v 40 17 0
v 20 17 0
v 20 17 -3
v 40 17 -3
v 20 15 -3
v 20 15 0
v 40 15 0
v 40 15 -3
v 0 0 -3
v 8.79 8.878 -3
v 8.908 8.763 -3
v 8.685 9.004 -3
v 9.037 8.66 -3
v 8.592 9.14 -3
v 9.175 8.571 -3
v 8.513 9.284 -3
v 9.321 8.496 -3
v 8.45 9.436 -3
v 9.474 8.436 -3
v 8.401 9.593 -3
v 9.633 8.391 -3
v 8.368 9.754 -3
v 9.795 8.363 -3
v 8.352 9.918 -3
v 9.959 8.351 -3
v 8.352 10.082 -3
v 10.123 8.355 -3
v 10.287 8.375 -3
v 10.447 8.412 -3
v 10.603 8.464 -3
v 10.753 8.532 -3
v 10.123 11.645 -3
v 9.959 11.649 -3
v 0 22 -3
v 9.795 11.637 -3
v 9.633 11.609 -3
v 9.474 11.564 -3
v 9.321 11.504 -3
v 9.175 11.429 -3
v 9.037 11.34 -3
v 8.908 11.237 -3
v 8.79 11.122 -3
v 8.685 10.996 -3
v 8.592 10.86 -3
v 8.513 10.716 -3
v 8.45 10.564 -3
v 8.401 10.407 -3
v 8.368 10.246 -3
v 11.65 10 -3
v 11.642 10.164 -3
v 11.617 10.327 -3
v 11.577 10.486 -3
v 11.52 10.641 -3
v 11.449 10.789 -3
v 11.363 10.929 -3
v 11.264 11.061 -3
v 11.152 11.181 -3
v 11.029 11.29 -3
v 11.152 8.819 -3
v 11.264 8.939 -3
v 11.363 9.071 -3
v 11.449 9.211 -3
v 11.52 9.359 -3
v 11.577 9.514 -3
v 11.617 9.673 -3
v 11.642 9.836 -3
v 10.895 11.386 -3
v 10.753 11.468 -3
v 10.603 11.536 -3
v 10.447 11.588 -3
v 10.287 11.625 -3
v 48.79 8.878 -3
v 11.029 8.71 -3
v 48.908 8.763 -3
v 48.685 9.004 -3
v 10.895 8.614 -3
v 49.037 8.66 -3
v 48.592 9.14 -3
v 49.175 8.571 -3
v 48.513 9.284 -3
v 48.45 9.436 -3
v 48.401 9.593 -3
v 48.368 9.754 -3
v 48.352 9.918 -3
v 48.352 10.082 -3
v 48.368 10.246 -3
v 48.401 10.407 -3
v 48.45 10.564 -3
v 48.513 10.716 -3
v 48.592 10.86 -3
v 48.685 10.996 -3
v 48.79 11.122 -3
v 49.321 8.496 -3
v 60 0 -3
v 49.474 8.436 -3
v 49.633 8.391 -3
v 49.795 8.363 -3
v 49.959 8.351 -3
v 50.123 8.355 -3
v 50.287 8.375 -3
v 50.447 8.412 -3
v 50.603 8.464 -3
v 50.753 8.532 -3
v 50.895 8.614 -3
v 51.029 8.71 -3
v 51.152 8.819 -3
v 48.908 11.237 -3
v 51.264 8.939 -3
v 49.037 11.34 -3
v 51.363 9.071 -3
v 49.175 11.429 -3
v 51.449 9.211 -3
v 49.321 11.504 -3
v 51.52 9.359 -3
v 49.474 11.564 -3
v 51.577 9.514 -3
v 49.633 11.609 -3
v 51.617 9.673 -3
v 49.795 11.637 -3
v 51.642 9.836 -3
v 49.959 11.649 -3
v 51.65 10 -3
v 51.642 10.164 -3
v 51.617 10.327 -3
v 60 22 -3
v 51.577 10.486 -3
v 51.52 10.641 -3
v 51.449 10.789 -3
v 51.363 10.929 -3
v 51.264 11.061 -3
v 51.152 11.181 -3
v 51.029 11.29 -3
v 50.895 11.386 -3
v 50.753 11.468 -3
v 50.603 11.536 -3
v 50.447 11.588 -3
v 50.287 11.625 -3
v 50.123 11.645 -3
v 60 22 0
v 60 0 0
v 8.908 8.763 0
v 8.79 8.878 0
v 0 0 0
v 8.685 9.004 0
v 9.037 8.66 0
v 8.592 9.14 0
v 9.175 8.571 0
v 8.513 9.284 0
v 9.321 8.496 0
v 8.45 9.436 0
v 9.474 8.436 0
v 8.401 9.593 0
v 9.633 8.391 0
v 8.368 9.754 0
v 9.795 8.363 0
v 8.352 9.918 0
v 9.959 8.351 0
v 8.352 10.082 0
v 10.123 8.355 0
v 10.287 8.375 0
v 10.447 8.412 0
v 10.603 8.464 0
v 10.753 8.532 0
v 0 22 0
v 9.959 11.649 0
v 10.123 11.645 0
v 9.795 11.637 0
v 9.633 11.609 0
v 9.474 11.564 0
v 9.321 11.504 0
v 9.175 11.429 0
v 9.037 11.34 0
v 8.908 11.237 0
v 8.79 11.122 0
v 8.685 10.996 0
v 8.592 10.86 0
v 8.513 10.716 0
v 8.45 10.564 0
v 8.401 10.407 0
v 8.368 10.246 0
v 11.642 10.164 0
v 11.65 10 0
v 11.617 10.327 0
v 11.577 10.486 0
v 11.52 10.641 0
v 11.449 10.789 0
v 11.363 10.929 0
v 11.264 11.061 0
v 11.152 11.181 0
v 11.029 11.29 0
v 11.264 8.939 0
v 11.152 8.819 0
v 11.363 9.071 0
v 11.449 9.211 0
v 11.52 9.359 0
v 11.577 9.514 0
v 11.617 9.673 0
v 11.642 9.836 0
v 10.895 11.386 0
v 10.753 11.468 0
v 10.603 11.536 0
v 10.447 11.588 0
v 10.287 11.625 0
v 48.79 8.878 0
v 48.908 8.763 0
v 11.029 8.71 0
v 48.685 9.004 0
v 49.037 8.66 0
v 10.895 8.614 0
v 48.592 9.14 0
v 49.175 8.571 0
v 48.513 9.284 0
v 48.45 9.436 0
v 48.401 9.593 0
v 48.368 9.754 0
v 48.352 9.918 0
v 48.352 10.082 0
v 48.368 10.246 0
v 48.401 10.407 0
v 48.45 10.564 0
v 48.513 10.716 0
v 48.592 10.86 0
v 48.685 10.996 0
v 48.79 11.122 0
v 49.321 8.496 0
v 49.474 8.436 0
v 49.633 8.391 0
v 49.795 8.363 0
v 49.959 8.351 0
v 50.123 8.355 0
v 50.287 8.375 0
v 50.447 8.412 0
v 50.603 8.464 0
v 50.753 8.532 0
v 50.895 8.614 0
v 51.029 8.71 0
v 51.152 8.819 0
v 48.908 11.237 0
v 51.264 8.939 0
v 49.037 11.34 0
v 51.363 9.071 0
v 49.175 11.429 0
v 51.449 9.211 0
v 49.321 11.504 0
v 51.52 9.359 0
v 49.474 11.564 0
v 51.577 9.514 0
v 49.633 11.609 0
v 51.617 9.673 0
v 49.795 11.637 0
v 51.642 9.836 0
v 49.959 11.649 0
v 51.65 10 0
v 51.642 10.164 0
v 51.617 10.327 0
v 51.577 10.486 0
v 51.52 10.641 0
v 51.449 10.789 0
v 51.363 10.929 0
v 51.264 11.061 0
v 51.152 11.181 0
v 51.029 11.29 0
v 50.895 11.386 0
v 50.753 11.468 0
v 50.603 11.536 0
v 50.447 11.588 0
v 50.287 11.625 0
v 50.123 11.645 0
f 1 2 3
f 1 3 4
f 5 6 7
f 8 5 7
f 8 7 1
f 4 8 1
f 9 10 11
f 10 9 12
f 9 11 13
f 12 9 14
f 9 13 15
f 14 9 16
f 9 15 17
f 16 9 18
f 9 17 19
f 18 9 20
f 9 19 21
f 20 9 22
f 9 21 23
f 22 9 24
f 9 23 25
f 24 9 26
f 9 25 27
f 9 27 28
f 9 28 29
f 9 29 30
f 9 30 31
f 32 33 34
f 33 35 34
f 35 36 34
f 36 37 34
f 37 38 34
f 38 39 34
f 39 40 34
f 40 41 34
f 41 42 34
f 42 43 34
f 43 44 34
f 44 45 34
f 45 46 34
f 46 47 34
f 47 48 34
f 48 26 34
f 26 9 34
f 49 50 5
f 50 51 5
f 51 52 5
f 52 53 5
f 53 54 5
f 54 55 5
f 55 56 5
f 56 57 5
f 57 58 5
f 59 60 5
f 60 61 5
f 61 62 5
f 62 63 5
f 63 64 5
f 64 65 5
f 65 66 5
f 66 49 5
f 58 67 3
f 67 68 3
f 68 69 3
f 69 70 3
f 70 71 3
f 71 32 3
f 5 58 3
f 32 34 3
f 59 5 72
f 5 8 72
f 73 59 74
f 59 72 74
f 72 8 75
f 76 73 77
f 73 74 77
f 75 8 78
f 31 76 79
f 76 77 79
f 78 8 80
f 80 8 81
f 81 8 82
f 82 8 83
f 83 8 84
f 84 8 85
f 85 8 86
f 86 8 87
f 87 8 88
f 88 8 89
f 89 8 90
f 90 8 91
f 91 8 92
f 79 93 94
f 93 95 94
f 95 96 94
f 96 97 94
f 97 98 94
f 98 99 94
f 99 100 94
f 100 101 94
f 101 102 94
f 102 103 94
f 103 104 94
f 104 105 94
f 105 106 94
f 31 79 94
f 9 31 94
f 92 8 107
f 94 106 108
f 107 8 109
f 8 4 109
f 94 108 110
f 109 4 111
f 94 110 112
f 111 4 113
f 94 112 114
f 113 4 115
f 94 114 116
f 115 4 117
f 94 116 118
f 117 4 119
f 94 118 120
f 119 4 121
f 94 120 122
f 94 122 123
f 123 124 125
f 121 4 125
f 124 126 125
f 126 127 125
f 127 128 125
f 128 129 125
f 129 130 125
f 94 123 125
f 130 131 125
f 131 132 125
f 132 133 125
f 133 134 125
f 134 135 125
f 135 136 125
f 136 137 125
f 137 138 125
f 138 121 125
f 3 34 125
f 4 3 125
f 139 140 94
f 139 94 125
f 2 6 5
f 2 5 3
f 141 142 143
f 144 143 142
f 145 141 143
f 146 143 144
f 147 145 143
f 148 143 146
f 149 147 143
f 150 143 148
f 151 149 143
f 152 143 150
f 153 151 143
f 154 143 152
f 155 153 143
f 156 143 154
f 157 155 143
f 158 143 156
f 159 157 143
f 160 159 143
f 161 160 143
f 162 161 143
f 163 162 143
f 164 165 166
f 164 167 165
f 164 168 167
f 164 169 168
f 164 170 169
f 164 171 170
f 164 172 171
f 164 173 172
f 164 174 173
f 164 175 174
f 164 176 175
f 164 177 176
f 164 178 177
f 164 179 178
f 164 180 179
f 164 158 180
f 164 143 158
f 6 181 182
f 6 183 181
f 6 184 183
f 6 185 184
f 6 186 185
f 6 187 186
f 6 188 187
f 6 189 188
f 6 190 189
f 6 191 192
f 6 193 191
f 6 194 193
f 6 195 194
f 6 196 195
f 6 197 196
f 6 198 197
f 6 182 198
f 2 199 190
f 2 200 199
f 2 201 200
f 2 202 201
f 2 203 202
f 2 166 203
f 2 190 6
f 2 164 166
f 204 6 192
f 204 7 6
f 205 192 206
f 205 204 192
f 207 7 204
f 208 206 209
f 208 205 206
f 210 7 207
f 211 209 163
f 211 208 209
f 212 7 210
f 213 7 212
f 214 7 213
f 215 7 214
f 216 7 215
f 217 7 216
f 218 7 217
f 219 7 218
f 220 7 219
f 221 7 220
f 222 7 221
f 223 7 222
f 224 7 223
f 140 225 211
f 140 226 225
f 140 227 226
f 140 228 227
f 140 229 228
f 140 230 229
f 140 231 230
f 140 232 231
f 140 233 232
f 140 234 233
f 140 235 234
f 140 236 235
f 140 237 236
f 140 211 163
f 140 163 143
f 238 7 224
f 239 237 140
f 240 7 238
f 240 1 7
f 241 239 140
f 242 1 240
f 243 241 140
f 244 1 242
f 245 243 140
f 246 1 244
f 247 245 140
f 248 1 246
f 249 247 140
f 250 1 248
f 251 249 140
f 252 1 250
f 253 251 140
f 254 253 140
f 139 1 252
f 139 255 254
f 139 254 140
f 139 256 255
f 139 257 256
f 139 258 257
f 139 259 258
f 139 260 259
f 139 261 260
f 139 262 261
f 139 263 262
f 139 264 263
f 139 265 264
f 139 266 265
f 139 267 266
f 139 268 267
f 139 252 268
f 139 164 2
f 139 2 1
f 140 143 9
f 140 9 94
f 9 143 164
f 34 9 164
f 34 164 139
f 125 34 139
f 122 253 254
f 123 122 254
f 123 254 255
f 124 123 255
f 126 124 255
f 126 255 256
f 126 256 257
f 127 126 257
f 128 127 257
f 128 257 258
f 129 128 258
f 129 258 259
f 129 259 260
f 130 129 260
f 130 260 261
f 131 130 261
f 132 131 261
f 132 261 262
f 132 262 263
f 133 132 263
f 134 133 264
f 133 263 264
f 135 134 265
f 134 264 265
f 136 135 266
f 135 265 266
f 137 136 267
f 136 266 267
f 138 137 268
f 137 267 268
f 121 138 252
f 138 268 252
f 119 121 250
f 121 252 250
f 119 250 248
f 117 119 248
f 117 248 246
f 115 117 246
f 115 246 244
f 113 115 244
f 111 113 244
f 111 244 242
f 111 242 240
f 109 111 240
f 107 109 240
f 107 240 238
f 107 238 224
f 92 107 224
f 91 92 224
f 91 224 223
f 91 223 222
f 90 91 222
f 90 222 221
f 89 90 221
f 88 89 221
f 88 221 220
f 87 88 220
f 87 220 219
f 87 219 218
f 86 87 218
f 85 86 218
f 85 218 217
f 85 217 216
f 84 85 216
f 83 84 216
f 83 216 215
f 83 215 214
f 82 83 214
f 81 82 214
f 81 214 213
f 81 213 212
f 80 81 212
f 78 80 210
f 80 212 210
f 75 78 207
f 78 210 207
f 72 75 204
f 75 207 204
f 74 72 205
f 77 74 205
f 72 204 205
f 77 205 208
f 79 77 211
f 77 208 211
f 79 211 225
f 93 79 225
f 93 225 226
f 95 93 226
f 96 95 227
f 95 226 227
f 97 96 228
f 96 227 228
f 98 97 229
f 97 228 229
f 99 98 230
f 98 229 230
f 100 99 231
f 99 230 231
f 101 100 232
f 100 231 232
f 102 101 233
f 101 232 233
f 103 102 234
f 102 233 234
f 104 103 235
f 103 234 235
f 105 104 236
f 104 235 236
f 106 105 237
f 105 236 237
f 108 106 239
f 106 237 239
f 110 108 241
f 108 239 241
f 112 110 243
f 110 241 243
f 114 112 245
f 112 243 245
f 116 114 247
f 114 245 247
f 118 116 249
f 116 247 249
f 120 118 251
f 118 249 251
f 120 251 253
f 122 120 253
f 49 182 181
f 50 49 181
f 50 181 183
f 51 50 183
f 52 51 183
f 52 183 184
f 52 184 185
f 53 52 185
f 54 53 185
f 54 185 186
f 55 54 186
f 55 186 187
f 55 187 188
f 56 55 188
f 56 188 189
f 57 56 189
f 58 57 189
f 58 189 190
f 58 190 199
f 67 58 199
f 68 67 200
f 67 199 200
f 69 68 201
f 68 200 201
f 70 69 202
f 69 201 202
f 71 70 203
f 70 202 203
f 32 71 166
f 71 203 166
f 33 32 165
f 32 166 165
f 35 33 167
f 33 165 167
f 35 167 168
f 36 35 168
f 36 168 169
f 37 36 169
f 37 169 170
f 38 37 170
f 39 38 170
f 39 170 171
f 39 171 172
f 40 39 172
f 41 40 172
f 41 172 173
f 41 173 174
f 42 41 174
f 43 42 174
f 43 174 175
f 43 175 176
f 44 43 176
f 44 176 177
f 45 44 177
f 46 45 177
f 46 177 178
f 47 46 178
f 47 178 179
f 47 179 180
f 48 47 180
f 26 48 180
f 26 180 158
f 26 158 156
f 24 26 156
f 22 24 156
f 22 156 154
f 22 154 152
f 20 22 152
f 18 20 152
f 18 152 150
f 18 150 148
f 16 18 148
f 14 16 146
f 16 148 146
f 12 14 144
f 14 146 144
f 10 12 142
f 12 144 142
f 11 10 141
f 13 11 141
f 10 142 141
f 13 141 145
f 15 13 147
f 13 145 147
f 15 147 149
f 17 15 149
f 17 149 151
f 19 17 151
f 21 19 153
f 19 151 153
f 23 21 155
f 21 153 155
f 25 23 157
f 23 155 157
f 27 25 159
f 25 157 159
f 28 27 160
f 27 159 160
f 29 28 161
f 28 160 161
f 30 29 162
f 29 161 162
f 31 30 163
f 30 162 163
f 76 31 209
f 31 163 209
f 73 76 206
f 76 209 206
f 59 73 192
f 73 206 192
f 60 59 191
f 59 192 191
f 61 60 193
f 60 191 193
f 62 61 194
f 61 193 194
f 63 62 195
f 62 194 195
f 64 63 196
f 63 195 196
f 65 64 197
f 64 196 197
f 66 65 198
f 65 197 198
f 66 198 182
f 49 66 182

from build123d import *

# Parameters (mm, degrees)
SKETCH_2_W             = 60
SKETCH_2_H             = 22
SM_BASE_FLANGE_1_DEPTH = 3
SKETCH_7_W             = 20
SKETCH_7_H             = 2
CUT_EXTRUDE_1_DEPTH    = 30
SKETCH_8_R             = 1.65
CUT_EXTRUDE_2_DEPTH    = 10


# Sheet-metal steps are written as plain solids
with BuildPart() as part:
    # Sketch 2 → 基体-法兰1 (new body)
    with BuildSketch(Plane.XY):
        with Locations((30, 11)):
            Rectangle(SKETCH_2_W, SKETCH_2_H)
    extrude(amount=-SM_BASE_FLANGE_1_DEPTH)

    # 草图7 → 切除-拉伸1 (cut)
    with BuildSketch(Plane.XY):
        with Locations((30, 16)):
            Rectangle(SKETCH_7_W, SKETCH_7_H)
    extrude(amount=-CUT_EXTRUDE_1_DEPTH, mode=Mode.SUBTRACT)

    # 草图8 → 切除-拉伸2 (cut)
    with BuildSketch(Plane.XY):
        with Locations((10, 10)):
            Circle(SKETCH_8_R)
        with Locations((50, 10)):
            Circle(SKETCH_8_R)
    extrude(amount=-CUT_EXTRUDE_2_DEPTH, mode=Mode.SUBTRACT)


solid = part.part
